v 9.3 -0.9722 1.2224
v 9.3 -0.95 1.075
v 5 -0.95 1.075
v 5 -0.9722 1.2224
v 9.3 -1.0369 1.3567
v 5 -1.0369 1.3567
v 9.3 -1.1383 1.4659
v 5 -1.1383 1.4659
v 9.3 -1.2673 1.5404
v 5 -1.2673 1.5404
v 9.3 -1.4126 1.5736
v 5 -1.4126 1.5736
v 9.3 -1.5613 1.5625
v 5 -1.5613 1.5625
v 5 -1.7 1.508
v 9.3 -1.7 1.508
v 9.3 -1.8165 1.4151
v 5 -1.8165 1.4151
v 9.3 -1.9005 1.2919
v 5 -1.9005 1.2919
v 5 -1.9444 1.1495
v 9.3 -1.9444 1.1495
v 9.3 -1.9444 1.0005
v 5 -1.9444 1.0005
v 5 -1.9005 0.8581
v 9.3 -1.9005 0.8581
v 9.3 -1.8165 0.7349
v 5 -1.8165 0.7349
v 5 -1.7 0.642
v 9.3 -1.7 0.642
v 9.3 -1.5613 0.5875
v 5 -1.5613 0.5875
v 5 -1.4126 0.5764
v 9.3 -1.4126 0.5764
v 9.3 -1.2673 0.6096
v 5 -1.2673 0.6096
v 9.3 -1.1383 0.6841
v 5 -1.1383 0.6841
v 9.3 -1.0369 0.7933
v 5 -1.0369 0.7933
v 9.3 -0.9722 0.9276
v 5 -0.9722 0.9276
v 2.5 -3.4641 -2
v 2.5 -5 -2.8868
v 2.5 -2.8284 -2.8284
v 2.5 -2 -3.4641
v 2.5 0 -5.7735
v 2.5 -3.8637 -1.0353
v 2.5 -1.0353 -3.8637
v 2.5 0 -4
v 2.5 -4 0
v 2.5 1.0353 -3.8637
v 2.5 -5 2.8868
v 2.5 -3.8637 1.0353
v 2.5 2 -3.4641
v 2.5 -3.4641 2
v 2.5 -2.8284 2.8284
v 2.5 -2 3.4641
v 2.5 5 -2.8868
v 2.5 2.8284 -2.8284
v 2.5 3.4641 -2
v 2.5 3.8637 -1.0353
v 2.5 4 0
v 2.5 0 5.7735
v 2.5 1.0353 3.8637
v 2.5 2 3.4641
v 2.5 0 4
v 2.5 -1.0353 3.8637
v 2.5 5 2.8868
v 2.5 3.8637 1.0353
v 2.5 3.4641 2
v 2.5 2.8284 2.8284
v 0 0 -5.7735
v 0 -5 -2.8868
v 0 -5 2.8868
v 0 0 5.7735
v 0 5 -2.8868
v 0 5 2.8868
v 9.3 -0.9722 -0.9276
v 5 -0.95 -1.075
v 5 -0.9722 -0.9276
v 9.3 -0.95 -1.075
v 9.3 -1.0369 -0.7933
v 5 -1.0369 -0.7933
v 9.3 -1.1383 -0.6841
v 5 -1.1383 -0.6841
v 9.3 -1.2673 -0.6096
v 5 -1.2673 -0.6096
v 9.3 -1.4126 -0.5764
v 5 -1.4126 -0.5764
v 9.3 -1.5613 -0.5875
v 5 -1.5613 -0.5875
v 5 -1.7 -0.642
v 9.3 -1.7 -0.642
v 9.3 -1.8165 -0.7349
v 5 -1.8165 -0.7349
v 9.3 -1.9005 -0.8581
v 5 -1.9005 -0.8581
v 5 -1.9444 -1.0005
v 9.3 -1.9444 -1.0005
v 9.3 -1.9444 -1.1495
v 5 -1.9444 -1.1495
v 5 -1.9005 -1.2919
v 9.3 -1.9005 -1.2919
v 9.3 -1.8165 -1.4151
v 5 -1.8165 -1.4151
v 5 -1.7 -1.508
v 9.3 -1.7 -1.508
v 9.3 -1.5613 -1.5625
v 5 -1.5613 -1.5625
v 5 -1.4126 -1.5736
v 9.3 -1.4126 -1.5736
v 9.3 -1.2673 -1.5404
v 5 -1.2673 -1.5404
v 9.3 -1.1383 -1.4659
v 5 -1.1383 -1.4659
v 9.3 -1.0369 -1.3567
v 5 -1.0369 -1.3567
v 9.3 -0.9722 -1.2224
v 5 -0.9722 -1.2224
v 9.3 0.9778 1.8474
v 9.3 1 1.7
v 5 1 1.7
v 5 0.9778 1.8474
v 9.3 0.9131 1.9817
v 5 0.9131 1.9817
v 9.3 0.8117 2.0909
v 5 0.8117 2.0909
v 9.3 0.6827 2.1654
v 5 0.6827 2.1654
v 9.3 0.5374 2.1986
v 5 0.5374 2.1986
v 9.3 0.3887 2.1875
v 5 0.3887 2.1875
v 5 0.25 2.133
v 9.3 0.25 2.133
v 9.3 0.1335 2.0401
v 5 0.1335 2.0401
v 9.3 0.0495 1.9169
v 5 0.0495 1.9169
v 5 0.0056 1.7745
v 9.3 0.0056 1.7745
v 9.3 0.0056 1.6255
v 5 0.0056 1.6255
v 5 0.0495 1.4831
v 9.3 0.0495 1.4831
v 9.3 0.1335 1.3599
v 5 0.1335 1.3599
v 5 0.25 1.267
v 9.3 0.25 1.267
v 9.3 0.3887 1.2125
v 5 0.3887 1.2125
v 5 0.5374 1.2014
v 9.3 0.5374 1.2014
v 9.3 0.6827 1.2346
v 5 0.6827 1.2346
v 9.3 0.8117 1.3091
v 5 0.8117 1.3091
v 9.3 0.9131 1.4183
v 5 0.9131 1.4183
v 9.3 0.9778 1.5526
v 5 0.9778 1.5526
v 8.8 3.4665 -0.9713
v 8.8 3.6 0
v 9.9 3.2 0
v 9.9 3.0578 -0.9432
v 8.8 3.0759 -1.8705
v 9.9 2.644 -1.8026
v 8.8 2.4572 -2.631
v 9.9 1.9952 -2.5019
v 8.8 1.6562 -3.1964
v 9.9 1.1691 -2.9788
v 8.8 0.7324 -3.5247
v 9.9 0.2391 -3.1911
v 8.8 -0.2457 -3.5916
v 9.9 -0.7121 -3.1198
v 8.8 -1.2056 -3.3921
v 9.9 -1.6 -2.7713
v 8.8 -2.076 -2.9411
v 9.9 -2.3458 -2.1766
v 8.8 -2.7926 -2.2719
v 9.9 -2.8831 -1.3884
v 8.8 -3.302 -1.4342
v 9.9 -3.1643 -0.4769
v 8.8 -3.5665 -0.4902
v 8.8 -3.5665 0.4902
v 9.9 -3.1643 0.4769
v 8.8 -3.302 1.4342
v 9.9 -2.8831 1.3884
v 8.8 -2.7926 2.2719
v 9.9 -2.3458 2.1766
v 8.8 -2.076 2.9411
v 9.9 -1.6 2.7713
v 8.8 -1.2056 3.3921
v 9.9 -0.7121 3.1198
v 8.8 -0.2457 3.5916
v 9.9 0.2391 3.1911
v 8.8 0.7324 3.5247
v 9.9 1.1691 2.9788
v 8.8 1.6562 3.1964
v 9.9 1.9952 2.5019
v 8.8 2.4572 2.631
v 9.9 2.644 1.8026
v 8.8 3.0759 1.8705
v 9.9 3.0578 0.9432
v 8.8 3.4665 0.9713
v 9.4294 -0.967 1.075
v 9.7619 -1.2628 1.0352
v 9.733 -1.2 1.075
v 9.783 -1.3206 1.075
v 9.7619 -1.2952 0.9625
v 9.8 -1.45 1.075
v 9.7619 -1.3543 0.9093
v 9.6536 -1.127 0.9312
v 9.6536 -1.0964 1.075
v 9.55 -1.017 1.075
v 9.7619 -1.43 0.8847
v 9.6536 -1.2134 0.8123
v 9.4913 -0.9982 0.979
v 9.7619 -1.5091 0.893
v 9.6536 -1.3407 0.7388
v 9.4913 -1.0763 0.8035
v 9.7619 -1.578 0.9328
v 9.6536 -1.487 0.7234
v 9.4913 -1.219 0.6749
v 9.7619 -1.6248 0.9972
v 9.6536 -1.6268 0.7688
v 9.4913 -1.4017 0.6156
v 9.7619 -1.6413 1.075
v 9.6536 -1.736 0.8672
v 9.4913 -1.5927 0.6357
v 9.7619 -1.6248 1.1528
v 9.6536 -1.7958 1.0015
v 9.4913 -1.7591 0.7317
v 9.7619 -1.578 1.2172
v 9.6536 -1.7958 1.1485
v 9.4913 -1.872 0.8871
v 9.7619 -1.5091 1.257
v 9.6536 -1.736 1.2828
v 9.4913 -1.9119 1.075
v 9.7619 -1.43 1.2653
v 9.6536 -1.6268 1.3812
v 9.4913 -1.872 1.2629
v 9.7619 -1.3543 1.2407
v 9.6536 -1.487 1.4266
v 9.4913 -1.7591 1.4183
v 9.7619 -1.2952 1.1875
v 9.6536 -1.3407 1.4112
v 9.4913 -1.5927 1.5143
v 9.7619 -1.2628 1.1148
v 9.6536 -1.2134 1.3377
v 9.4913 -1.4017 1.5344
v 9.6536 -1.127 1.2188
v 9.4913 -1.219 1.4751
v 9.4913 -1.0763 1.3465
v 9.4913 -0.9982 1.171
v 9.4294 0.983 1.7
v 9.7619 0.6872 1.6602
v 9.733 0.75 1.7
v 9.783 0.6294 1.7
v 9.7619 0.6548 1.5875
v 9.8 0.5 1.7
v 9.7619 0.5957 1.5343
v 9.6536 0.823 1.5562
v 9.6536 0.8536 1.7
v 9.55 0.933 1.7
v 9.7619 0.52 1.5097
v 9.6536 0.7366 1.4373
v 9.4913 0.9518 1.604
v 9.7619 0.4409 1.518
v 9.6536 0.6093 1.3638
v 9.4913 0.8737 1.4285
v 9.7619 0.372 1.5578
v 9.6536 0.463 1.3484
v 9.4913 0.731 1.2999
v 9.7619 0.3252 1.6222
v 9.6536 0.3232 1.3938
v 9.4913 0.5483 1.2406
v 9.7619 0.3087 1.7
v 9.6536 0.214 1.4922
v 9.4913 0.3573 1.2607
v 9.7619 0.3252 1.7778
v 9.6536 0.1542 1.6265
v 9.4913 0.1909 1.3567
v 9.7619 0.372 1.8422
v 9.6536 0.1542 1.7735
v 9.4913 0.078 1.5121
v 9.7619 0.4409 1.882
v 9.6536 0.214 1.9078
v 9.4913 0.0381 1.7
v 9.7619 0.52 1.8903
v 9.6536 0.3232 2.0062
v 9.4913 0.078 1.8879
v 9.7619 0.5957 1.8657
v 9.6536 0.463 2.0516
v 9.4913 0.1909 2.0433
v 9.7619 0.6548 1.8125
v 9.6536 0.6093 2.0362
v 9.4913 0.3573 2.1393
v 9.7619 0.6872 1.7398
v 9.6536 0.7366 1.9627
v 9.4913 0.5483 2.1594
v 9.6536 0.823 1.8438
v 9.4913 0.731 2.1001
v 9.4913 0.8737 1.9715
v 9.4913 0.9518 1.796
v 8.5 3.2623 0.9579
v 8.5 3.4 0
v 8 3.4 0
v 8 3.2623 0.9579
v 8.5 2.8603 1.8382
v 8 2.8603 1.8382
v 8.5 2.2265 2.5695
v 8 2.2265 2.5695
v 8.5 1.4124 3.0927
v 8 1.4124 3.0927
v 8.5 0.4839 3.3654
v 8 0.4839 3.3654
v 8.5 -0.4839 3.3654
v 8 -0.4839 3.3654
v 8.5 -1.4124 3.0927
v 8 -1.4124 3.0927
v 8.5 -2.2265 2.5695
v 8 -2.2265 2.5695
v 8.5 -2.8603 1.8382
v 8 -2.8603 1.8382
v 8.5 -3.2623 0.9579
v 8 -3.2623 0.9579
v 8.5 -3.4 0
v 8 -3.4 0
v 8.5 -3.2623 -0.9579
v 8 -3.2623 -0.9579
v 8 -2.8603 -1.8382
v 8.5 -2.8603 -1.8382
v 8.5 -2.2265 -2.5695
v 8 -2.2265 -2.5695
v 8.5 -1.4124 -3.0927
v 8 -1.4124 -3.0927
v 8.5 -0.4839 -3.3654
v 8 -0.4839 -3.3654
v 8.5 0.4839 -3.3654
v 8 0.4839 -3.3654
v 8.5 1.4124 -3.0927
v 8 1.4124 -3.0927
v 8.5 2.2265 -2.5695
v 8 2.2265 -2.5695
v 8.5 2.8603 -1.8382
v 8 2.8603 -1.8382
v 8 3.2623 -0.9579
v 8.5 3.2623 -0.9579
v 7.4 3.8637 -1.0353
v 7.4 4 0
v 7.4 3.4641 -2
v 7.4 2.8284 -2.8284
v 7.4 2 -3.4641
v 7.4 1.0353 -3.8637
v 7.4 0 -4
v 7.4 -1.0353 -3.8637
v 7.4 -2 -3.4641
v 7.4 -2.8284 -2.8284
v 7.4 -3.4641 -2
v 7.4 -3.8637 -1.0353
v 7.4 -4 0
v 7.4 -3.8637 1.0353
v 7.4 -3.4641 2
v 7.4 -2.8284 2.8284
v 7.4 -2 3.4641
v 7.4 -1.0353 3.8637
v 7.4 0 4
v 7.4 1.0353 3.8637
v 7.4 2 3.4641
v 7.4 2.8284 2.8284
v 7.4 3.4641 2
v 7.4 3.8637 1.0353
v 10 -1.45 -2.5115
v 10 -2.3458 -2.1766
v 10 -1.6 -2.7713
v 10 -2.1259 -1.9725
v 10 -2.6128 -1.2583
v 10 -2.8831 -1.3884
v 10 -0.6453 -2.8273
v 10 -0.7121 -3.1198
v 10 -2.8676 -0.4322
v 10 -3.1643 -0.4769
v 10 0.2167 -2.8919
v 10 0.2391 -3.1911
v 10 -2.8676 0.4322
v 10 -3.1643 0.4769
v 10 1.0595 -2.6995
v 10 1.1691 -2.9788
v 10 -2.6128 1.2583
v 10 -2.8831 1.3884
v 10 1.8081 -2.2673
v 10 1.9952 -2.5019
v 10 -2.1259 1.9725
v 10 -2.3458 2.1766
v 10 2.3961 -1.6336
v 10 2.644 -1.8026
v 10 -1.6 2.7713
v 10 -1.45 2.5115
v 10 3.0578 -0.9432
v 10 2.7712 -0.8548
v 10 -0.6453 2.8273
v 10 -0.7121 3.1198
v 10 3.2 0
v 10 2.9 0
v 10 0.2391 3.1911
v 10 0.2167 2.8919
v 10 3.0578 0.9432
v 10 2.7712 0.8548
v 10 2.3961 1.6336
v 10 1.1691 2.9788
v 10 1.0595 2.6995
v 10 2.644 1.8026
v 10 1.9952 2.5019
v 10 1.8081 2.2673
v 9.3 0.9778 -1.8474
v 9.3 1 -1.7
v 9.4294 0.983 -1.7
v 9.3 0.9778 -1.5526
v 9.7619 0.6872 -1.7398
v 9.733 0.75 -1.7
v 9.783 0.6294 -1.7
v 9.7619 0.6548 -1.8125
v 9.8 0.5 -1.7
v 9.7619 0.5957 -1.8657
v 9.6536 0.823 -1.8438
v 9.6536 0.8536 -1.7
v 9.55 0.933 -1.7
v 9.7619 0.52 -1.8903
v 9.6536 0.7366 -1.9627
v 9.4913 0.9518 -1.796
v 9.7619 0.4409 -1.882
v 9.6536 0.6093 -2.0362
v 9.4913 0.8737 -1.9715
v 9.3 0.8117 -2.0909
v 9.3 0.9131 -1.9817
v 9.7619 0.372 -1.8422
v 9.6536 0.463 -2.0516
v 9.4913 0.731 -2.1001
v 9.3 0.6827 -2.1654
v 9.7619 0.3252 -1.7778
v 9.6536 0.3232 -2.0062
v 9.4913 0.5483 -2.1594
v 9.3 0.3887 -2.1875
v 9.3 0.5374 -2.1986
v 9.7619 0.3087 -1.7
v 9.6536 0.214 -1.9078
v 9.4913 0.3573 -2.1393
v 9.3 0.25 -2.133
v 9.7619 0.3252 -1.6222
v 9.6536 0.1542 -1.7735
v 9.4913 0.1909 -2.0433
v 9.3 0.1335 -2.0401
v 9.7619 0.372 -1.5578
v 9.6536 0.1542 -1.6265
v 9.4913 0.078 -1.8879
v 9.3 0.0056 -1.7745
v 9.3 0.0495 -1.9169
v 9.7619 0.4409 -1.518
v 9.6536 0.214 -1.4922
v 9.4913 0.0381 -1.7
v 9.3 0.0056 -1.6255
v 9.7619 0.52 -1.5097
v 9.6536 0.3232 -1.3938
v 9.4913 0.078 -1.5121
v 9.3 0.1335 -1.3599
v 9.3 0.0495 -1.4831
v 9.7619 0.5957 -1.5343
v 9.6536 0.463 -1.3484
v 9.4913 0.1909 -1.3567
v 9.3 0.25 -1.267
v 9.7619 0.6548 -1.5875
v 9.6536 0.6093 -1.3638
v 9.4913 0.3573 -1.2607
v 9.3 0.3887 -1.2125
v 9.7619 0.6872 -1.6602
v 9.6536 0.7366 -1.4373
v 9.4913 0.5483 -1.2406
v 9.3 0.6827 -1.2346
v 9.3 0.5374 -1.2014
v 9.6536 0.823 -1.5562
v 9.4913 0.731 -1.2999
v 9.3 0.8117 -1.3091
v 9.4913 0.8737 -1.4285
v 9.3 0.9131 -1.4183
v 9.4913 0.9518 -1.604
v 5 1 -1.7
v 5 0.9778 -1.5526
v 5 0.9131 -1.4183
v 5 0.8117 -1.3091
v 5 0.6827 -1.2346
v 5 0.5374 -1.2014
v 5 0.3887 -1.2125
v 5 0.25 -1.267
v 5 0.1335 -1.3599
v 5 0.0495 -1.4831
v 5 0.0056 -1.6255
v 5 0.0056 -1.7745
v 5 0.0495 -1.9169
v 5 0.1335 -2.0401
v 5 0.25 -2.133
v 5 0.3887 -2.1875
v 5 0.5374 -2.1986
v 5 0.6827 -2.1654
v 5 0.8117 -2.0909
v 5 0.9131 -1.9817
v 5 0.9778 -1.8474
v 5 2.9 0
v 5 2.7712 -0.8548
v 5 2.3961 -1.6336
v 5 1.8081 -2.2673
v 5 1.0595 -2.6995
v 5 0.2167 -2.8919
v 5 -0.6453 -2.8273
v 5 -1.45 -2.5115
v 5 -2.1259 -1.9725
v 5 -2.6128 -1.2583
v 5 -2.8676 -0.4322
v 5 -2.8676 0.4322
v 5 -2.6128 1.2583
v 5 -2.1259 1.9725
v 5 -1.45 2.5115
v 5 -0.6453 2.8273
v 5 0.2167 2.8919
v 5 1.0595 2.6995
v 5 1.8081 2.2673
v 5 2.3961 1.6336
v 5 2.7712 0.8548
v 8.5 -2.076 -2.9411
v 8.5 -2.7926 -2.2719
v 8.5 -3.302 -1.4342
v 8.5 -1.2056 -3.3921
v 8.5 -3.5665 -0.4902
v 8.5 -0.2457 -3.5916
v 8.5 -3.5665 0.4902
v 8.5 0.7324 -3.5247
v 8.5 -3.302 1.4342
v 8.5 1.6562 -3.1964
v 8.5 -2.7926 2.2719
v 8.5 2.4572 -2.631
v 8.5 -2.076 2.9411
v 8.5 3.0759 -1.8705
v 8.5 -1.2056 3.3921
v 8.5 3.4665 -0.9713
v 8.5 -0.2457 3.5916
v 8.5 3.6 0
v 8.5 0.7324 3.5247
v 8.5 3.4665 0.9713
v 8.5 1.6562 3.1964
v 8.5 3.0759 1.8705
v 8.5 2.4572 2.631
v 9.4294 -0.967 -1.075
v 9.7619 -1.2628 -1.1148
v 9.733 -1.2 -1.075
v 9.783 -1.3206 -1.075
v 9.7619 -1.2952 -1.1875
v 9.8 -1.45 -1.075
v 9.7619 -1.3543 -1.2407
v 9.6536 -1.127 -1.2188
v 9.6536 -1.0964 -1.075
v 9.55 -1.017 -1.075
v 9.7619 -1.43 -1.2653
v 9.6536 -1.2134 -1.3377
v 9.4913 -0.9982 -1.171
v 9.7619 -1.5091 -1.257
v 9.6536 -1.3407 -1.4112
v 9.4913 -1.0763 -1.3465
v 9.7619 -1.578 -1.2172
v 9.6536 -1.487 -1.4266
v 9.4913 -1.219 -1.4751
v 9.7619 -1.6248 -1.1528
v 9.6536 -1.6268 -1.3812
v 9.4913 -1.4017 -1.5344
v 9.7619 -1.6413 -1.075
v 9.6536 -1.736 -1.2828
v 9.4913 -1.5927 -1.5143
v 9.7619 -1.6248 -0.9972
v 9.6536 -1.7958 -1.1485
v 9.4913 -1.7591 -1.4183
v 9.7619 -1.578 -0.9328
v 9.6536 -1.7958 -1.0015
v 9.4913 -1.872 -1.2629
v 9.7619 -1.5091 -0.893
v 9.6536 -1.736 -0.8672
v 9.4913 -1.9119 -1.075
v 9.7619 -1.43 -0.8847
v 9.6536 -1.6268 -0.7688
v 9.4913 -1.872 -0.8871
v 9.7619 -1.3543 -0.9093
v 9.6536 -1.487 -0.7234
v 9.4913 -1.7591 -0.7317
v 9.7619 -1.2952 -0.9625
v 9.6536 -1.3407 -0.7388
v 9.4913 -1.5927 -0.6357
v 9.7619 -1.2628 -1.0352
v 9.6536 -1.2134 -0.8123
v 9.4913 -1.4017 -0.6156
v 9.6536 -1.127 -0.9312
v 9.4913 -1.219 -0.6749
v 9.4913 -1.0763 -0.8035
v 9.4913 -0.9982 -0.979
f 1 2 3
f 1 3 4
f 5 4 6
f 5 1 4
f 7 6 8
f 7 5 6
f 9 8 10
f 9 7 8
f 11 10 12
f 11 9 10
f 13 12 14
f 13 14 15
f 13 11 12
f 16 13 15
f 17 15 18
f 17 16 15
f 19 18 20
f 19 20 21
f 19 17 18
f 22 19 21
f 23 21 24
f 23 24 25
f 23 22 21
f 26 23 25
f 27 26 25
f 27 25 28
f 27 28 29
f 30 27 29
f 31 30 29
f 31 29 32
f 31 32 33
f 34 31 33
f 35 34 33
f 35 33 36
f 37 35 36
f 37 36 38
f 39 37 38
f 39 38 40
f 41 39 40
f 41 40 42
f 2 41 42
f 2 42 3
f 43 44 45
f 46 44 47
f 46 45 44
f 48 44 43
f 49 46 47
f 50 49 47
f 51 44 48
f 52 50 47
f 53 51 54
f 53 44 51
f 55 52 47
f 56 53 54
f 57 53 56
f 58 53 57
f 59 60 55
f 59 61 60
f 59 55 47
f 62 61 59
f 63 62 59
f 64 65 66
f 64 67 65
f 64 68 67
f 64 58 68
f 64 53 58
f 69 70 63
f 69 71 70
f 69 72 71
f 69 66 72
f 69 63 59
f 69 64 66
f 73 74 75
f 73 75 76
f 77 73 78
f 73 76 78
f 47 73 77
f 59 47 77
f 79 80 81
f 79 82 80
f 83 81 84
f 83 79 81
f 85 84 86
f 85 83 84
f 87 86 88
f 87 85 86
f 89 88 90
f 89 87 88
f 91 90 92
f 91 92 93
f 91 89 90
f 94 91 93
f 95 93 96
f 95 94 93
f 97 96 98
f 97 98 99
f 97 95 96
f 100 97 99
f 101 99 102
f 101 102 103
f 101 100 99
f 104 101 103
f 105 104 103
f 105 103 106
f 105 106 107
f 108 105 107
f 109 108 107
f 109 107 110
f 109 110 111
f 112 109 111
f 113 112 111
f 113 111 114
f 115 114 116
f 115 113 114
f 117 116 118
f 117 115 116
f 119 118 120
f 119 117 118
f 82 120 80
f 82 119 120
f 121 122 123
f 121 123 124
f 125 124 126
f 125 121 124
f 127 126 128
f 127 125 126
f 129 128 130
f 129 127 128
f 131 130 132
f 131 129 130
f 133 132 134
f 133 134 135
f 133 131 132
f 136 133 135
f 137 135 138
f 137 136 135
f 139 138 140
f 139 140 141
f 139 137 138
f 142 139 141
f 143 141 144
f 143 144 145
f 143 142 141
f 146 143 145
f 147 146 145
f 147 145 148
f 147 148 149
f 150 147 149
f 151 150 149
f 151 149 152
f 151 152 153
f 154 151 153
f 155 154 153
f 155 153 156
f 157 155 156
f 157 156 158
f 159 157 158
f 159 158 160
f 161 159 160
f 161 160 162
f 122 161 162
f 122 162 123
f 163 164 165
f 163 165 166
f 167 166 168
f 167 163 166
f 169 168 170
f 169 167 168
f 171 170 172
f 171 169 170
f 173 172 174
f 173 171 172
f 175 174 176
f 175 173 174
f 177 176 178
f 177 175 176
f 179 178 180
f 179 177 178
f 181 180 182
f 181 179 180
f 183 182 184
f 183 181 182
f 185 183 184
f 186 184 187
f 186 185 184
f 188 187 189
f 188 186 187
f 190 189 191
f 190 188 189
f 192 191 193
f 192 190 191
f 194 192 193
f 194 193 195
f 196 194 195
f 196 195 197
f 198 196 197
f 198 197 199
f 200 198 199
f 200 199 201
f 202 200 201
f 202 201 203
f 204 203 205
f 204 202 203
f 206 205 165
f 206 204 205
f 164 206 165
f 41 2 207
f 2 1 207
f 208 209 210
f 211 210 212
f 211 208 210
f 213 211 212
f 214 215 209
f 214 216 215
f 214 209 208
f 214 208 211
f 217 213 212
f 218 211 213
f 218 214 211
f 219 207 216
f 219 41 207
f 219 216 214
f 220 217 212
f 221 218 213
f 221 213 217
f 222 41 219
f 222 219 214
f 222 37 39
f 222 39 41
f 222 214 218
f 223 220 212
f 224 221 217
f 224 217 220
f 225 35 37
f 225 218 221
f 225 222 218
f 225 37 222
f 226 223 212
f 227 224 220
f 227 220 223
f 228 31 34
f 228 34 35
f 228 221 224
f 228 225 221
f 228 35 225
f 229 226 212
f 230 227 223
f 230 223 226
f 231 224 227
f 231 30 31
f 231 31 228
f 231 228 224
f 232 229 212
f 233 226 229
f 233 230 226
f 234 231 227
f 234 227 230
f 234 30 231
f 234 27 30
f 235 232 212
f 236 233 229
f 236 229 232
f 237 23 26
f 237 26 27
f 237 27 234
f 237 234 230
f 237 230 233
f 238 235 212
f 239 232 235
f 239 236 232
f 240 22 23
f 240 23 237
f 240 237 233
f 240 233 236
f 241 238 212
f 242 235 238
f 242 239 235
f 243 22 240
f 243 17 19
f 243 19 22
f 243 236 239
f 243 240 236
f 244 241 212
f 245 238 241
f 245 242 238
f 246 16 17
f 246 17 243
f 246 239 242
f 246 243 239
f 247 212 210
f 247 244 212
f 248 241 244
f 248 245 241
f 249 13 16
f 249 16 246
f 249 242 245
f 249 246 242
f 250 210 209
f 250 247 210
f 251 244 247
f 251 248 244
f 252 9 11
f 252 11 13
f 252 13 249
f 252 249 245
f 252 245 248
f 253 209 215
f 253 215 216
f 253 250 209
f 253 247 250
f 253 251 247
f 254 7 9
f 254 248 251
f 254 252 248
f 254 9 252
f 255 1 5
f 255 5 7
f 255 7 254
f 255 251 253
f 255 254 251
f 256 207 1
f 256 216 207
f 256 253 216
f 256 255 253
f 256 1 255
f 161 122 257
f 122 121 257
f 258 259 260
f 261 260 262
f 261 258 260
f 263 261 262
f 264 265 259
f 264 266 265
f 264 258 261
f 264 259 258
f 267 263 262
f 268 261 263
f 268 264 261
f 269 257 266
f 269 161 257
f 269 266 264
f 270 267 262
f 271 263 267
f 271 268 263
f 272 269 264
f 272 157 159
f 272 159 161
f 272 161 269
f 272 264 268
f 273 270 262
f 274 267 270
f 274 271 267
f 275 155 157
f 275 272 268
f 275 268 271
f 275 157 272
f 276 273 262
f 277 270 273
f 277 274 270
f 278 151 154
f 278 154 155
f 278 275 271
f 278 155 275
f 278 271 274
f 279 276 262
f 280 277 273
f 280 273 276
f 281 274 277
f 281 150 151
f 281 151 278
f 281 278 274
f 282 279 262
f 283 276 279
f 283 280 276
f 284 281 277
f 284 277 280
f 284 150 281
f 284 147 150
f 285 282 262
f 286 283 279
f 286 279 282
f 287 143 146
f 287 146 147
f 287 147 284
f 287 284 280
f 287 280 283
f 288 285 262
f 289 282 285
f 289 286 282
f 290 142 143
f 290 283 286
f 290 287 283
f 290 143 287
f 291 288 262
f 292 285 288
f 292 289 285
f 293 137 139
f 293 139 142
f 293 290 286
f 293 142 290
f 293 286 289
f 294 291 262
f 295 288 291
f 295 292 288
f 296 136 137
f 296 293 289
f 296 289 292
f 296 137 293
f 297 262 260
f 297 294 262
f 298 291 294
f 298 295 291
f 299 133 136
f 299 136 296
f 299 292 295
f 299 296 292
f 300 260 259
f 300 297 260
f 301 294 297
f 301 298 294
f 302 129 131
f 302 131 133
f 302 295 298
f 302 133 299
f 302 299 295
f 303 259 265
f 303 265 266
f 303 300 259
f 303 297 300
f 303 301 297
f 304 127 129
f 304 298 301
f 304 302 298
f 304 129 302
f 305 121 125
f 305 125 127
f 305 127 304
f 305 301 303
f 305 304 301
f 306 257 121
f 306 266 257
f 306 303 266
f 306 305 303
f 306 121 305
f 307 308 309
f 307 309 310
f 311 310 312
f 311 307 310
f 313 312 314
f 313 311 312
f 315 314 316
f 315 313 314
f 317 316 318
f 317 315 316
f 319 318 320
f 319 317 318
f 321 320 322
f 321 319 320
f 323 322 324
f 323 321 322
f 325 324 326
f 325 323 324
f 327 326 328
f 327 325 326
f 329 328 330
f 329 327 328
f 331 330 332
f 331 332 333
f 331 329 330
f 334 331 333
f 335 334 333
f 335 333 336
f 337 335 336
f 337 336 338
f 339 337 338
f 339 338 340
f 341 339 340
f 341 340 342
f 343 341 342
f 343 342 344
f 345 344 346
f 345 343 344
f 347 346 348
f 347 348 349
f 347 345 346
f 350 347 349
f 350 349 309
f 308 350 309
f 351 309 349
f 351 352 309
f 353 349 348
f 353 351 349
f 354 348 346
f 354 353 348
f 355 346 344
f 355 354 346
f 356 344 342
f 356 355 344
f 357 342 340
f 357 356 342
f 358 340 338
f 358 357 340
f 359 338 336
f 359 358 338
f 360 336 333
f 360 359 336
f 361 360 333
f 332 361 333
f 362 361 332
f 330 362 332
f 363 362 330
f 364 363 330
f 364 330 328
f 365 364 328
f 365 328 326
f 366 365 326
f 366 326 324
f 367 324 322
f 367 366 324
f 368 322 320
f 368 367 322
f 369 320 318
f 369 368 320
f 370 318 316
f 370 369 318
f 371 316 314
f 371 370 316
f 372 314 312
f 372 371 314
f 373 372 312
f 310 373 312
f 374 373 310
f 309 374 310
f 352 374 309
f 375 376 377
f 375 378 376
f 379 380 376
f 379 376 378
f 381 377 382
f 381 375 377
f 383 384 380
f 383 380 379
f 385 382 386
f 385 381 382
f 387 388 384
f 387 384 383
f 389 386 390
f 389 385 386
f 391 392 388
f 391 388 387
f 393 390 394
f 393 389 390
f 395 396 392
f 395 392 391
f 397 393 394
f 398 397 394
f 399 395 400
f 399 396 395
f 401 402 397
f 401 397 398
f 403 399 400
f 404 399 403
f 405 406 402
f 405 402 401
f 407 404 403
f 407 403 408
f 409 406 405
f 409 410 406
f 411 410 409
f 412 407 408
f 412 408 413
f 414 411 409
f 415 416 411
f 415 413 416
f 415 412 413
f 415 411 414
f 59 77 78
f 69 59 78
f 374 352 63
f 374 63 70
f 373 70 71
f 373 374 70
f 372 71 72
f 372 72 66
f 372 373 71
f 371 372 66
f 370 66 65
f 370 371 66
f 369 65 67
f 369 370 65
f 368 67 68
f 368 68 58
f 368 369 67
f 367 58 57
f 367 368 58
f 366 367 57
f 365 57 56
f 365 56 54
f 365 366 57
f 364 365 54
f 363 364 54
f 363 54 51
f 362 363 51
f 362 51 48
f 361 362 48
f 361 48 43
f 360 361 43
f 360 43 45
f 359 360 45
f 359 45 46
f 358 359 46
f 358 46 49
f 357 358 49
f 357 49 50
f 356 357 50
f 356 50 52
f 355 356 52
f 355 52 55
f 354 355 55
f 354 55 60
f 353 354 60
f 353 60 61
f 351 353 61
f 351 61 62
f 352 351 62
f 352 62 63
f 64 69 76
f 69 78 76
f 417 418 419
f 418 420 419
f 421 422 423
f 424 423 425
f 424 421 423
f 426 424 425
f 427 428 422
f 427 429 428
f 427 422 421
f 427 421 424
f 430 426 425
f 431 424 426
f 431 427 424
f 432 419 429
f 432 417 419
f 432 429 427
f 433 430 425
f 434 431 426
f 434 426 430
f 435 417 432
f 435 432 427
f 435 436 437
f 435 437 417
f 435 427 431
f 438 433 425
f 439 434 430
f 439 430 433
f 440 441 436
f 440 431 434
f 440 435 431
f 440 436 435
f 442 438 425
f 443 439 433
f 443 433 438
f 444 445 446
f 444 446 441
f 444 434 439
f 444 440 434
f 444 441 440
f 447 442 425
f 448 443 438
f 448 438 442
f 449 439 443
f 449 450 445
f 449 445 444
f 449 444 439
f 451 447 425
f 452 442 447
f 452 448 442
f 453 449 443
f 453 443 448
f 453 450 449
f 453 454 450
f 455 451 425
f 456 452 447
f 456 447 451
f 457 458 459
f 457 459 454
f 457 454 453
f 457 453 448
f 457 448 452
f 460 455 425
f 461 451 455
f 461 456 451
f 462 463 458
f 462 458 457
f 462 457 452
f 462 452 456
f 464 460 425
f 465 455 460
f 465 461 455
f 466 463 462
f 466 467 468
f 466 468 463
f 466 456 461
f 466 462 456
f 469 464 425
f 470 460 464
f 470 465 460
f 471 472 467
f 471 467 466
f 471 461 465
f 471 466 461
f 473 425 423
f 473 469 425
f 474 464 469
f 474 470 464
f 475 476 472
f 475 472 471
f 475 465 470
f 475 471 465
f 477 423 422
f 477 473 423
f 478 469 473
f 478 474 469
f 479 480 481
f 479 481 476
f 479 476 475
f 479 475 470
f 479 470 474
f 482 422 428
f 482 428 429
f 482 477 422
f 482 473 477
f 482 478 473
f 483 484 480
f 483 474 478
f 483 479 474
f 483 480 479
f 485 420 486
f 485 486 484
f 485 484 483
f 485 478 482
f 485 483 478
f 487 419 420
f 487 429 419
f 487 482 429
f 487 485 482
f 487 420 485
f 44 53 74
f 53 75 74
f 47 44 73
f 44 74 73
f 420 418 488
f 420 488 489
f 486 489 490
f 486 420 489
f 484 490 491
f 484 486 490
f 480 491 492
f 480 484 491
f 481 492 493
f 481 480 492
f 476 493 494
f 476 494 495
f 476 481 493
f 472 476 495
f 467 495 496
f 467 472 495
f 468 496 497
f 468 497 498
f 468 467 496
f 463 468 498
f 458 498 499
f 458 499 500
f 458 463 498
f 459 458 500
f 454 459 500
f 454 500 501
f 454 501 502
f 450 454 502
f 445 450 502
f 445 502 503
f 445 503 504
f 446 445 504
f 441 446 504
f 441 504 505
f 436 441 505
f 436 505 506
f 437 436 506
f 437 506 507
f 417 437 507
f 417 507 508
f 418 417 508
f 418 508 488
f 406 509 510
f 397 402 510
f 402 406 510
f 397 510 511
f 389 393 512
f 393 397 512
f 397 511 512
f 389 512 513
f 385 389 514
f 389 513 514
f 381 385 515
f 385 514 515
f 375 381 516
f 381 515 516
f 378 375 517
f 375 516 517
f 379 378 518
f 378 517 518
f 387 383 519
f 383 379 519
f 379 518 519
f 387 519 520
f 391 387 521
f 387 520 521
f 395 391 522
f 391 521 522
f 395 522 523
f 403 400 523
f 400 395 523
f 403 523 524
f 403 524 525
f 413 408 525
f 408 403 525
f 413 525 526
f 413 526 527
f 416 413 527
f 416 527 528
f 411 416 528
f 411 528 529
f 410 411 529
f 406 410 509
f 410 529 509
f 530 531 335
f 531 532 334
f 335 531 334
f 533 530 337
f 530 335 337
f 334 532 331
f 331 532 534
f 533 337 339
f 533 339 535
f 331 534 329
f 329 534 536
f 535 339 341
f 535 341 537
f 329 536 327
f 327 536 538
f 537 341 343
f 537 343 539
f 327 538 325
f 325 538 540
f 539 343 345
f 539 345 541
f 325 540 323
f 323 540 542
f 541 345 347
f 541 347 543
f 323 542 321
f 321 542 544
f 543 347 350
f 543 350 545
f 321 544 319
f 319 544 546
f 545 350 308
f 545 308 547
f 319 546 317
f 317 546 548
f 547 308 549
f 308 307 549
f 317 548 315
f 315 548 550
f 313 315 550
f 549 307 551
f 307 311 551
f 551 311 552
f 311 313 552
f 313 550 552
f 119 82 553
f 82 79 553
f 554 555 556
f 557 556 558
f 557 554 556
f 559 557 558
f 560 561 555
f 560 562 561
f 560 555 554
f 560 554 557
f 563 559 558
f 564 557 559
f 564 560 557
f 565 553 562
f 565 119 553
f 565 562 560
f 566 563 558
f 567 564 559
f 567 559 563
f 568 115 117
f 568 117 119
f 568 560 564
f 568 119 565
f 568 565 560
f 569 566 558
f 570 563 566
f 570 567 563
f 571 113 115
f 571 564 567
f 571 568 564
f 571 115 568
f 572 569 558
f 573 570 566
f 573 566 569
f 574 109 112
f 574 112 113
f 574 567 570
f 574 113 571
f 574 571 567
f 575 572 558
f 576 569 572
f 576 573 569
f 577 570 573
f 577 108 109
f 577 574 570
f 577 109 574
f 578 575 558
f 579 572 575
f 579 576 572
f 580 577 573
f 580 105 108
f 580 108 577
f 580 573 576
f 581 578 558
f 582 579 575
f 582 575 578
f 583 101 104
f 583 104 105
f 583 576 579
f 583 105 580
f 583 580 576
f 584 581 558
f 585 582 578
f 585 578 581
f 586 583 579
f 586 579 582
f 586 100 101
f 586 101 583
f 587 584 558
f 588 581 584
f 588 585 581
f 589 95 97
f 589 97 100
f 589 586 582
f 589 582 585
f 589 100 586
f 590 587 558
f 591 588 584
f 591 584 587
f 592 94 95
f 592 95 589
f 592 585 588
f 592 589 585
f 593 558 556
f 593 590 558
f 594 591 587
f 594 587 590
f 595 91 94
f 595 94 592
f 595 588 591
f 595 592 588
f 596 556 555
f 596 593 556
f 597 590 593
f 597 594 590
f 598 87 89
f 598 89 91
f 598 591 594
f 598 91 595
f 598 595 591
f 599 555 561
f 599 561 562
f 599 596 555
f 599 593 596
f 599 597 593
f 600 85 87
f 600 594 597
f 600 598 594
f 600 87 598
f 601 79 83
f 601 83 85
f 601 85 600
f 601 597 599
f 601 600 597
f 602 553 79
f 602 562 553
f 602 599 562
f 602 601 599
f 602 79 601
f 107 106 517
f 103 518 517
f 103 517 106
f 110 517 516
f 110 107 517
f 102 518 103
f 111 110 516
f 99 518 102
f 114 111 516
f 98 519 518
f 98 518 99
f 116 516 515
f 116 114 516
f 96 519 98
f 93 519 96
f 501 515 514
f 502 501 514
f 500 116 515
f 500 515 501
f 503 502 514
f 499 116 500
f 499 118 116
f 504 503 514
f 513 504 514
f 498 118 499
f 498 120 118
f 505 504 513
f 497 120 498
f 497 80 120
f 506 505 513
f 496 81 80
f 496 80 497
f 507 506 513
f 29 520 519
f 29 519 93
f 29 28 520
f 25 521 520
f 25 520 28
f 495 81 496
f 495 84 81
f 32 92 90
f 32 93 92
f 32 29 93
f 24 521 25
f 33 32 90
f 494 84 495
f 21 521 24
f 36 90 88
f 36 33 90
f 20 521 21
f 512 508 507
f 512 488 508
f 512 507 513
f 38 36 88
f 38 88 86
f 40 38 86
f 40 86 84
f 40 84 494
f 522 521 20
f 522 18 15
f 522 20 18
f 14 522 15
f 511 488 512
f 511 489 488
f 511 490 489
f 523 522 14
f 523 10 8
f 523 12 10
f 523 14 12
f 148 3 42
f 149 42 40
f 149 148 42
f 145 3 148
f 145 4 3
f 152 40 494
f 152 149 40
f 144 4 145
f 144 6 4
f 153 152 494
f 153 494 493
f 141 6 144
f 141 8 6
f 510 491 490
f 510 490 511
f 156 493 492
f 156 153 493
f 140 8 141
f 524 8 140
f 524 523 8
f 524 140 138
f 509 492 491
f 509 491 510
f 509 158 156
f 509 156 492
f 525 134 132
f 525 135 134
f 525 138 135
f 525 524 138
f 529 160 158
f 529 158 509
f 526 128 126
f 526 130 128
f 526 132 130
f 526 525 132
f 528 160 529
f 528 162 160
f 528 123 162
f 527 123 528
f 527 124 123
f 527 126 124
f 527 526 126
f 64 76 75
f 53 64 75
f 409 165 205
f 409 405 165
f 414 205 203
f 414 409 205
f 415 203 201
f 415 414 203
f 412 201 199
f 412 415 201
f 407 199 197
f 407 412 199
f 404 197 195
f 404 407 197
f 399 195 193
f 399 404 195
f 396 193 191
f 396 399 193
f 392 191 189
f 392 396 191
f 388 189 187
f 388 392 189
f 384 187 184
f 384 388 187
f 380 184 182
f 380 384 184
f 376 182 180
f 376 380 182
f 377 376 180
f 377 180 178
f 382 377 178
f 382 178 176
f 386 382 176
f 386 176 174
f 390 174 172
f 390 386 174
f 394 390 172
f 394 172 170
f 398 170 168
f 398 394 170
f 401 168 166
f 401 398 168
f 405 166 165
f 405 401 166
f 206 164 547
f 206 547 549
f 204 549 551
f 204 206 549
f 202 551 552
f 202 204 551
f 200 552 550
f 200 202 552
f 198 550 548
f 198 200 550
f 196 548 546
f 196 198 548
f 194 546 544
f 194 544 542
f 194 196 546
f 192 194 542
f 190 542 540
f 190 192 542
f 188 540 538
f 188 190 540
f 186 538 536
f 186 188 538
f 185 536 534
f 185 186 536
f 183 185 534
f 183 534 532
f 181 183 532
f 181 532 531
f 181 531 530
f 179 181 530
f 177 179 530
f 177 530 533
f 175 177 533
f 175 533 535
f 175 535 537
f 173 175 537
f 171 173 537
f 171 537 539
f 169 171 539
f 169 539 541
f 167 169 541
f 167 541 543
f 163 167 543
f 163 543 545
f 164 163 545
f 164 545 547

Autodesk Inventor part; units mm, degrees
sketch "Sketch_1" plane through (0, 0, 0) normal (0, 0, 1) x (1, 0, 0)
  line L0 (10, 0) -> (0, 0)
  line L1 (0, 0) -> (0, 6)
  line L2 (0, 6) -> (2.5, 6)
  line L3 (2.5, 6) -> (2.5, 4)
  line L4 (2.5, 4) -> (7.4, 4)
  line L5 (7.4, 4) -> (8, 3.4)
  line L6 (8, 3.4) -> (8.5, 3.4)
  line L7 (8.5, 3.4) -> (8.5, 3.6)
  line L8 (8.5, 3.6) -> (8.8, 3.6)
  line L9 (8.8, 3.6) -> (9.9, 3.2)
  line L10 (9.9, 3.2) -> (10, 3.2)
  line L11 (10, 3.2) -> (10, 2.9)
  line L12 (10, 2.9) -> (5, 2.9)
  line L13 (5, 2.9) -> (5, 0)
  line L14 (5, 0) -> (0, 0)
revolve "Revolution1" add sketch "Sketch_1" angle 360 about axis through (10, 0, 0) along (1, 0, 0)
sketch "Sketch_2" plane through (0, 0, 0) normal (1, 0, 0) x (0, 1, 0)
  circle A0 centre (0, 0) radius 20
  line L0 (0, 5.7735) -> (-5, 2.8868)
  line L1 (-5, 2.8868) -> (-5, -2.8868)
  line L2 (-5, -2.8868) -> (0, -5.7735)
  line L3 (0, -5.7735) -> (5, -2.8868)
  line L4 (5, -2.8868) -> (5, 2.8868)
  line L5 (5, 2.8868) -> (0, 5.7735)
extrude "Extrusion1" cut sketch "Sketch_2" along normal blind 2.5
sketch "Sketch_3" plane through (0, 0, 1.7) normal (0, 0, 1) x (1, 0, 0)
  line L0 (9.8, 0.5) -> (5, 0.5)
  line L1 (5, 0.5) -> (5, 1)
  line L2 (5, 1) -> (9.3, 1)
  arc A0 (9.8, 0.5) -> (9.3, 1) centre (9.3, 0.5) ccw
  line L3 (9.8, 0.5) -> (5, 0.5)
revolve "Revolution2" add sketch "Sketch_3" angle 360 about axis through (9.8, 0.5, 1.7) along (1, 0, 0)
sketch "Pins_SKETCH_1" plane through (0, 0, -1.7) normal (0, 0, 1) x (1, 0, 0)
  line L0 (9.8, 0.5) -> (5, 0.5)
  line L1 (5, 0.5) -> (5, 1)
  line L2 (5, 1) -> (9.3, 1)
  arc A0 (9.8, 0.5) -> (9.3, 1) centre (9.3, 0.5) ccw
  line L3 (9.8, 0.5) -> (5, 0.5)
sketch "Pins_SKETCH_2" plane through (0, -1.95, -1.075) normal (0, 0, 1) x (1, 0, 0)
  line L0 (9.8, 0.5) -> (5, 0.5)
  line L1 (5, 0.5) -> (5, 1)
  line L2 (5, 1) -> (9.3, 1)
  arc A0 (9.8, 0.5) -> (9.3, 1) centre (9.3, 0.5) ccw
  line L3 (9.8, 0.5) -> (5, 0.5)
sketch "Pins_SKETCH_3" plane through (0, -1.95, 1.075) normal (0, 0, 1) x (1, 0, 0)
  line L0 (9.8, 0.5) -> (5, 0.5)
  line L1 (5, 0.5) -> (5, 1)
  line L2 (5, 1) -> (9.3, 1)
  arc A0 (9.8, 0.5) -> (9.3, 1) centre (9.3, 0.5) ccw
  line L3 (9.8, 0.5) -> (5, 0.5)
revolve "Revolution3" add sketch "Pins_SKETCH_1" angle 360 about axis through (9.8, 0.5, -1.7) along (1, 0, 0)
revolve "Revolution4" add sketch "Pins_SKETCH_2" angle 360 about axis through (9.8, -1.45, -1.075) along (1, 0, 0)
revolve "Revolution5" add sketch "Pins_SKETCH_3" angle 360 about axis through (9.8, -1.45, 1.075) along (1, 0, 0)
ref_plane "GEH_XY" through (0, 0, 0) normal (1, 0, 0) x (0, 0, -1)
ref_plane "GEH_YZ" through (0, 0, 0) normal (0, 0, -1) x (0, 1, 0)
ref_plane "GEH_ZX" through (0, 0, 0) normal (0, 1, 0) x (1, 0, 0)
properties part number "SCHUNK-SNT016581 Stecker EGP"
